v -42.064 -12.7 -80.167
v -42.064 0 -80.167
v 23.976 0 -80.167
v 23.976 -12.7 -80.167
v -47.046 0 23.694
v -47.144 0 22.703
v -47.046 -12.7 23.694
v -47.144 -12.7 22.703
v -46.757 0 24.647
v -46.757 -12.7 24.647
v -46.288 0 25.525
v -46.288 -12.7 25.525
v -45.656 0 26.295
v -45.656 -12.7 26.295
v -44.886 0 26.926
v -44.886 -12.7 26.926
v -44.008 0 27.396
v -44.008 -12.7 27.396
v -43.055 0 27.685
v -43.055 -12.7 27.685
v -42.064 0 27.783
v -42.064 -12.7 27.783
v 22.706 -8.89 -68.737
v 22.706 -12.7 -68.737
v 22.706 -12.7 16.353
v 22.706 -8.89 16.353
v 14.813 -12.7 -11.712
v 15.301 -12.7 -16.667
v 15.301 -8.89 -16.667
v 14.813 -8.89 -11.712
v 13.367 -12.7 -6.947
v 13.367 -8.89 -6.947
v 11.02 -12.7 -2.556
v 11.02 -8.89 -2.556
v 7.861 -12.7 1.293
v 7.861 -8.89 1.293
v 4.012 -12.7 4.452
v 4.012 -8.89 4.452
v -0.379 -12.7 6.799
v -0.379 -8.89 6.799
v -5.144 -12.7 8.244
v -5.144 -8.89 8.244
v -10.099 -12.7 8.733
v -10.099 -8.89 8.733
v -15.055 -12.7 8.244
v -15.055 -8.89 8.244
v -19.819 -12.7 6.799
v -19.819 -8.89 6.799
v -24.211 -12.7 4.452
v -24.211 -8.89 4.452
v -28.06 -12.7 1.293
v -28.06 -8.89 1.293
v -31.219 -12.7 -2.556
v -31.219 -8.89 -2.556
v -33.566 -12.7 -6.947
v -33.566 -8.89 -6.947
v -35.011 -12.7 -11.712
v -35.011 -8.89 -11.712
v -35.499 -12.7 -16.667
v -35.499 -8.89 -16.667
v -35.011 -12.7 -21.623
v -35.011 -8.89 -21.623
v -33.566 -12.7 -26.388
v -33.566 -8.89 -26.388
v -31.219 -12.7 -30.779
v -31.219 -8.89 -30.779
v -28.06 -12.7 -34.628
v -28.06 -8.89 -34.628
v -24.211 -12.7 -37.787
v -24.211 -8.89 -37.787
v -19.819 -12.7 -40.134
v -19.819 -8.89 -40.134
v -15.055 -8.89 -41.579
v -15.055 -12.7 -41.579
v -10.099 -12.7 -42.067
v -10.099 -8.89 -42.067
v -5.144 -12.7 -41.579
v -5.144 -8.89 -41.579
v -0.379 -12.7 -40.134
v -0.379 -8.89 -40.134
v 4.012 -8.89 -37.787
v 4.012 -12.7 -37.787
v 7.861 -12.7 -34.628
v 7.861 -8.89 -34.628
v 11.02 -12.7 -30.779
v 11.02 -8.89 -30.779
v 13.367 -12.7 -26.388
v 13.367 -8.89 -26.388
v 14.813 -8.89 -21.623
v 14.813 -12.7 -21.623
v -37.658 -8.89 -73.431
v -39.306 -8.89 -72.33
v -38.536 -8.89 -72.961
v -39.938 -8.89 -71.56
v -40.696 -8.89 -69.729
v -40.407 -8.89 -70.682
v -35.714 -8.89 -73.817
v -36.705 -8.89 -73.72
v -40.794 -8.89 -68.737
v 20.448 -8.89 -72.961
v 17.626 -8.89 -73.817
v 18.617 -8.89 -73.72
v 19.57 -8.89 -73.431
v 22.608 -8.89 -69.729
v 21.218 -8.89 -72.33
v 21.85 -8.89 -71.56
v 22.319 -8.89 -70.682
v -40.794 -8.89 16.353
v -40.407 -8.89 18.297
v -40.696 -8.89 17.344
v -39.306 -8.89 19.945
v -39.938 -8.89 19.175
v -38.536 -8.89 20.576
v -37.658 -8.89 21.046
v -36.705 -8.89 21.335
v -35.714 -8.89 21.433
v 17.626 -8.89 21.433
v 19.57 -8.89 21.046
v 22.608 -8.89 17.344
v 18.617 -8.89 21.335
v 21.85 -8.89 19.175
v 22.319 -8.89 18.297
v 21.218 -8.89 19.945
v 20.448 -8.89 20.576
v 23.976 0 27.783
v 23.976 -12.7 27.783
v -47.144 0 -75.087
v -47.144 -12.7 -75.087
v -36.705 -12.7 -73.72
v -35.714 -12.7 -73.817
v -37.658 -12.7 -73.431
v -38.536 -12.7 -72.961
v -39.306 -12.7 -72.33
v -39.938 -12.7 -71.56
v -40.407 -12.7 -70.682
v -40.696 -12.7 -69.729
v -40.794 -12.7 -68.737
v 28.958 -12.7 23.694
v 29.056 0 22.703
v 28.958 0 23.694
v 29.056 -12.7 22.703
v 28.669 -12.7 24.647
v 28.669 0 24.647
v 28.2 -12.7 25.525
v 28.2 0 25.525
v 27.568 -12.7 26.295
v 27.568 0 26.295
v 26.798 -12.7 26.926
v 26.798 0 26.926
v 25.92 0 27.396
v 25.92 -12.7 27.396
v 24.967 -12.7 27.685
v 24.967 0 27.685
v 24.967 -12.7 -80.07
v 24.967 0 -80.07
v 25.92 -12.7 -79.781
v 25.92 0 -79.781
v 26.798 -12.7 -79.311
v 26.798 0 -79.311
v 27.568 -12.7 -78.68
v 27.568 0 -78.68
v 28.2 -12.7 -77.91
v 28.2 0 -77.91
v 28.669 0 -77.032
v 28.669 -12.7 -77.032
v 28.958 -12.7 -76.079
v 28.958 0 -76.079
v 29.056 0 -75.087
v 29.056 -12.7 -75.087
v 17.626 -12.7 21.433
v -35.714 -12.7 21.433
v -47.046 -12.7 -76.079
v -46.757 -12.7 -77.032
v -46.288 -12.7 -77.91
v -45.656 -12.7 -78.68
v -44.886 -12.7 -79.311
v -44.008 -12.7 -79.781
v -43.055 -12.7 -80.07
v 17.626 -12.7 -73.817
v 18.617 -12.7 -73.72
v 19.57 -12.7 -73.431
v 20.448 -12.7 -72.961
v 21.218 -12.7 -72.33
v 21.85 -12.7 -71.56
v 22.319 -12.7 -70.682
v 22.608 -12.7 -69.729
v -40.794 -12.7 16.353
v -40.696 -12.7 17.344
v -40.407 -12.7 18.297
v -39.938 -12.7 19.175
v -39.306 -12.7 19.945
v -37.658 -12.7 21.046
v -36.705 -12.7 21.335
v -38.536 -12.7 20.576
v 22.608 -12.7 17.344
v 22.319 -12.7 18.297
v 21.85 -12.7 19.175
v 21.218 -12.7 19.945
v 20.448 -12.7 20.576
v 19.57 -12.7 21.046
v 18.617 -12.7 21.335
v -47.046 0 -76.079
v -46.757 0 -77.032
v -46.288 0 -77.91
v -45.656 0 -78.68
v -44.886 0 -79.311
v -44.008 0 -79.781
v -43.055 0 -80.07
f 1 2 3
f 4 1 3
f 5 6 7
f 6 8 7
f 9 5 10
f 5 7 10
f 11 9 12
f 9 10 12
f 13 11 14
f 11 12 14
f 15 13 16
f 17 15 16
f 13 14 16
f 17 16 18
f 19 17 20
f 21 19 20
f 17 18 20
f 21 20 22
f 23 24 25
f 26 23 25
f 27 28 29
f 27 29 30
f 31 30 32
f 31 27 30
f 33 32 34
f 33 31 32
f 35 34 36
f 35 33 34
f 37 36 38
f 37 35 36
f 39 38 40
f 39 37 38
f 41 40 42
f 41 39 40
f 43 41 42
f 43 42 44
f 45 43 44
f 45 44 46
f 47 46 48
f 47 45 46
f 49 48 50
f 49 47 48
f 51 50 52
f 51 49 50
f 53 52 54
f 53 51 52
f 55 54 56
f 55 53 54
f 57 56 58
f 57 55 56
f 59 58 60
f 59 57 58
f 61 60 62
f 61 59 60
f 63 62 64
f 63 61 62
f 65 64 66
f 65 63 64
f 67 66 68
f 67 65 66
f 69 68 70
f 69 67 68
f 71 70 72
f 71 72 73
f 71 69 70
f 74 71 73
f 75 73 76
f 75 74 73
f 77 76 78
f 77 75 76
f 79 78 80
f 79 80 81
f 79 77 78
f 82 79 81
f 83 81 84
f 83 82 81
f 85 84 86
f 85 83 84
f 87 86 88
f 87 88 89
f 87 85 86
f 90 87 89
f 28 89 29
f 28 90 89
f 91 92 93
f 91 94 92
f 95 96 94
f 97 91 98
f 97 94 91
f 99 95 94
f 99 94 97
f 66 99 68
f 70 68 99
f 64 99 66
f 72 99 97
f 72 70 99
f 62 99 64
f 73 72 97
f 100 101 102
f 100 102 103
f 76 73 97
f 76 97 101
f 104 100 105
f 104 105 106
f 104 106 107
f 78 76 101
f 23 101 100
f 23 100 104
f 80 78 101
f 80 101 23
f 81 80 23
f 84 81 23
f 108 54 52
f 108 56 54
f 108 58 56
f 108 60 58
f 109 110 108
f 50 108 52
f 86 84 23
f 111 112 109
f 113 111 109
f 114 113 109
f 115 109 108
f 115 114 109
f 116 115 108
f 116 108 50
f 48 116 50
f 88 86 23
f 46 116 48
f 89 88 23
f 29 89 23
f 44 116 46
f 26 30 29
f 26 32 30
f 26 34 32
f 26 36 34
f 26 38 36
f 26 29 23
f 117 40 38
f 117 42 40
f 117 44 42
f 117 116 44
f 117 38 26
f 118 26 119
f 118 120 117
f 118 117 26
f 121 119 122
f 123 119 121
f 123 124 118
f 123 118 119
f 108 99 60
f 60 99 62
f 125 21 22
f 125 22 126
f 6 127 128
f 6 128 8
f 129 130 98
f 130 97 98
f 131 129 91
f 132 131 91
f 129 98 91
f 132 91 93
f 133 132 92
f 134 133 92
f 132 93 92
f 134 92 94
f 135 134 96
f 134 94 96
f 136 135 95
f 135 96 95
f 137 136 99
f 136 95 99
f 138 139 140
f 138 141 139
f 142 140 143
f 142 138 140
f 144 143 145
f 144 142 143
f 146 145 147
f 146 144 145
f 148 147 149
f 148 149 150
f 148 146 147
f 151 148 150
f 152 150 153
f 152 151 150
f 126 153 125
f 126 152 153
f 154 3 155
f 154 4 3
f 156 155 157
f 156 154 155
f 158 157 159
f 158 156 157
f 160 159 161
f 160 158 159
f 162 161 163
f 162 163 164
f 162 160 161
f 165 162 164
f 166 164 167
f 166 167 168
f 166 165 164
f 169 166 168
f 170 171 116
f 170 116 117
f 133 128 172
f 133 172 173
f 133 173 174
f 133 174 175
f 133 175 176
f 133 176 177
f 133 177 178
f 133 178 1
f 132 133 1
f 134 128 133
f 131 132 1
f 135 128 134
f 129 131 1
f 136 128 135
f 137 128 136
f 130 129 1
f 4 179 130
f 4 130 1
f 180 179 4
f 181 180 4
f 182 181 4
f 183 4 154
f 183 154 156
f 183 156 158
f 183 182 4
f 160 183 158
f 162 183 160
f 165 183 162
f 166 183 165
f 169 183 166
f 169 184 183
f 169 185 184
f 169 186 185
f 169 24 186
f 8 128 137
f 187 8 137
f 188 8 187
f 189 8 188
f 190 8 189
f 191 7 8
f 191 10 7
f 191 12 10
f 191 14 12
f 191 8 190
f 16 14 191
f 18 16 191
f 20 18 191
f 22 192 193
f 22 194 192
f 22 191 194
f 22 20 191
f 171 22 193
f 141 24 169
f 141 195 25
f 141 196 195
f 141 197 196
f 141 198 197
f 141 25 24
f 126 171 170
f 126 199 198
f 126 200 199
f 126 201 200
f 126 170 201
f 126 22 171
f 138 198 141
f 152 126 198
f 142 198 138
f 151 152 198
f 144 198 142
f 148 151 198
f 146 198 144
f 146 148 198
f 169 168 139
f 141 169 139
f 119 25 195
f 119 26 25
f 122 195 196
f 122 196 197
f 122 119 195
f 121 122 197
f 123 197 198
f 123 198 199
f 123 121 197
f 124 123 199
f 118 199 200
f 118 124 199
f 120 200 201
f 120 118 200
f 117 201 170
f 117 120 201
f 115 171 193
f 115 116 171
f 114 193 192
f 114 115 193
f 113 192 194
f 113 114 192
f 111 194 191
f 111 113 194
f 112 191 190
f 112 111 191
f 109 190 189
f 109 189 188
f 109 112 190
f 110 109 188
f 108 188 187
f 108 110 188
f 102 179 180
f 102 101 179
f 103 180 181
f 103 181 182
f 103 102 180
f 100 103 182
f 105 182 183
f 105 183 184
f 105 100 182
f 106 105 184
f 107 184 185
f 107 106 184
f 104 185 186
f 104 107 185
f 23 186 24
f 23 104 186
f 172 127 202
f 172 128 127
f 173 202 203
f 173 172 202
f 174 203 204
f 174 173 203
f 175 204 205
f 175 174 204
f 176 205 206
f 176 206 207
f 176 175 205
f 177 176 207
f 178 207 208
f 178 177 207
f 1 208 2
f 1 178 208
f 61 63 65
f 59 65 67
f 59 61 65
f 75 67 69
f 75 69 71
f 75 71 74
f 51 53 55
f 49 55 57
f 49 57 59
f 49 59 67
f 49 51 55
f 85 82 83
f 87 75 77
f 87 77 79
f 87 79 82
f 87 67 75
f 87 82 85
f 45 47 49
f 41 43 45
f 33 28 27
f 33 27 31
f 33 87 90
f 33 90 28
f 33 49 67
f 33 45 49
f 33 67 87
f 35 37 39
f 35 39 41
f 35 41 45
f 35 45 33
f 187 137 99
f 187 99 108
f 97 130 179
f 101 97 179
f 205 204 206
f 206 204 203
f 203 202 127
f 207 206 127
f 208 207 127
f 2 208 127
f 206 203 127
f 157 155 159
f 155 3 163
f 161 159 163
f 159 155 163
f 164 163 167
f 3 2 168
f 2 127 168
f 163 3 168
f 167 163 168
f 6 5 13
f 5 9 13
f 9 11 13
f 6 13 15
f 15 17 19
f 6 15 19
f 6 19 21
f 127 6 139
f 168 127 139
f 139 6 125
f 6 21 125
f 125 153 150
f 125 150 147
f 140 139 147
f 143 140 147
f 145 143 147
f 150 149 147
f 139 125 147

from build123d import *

# Parameters (mm, degrees)
F0_W     = 76.2
F0_H     = 107.95
F1_DEPTH = 12.7
F2_R     = 5.08
F3_W     = 63.5
F3_H     = 95.25
F3_R     = 25.4
F4_DEPTH = 3.81
F5_R     = 5.08


with BuildPart() as f1:
    # F0 (on Front) → F1 (new body)
    with BuildSketch(Plane.XZ):
        with Locations((-9.044009, -26.192475)):
            Rectangle(F0_W, F0_H)
    extrude(amount=F1_DEPTH)

    # F2
    f2_edges = [f1.edges().sort_by_distance(p)[0] for p in [
        (-47.144009, -6.35, 27.782525),
        (29.055991, -6.35, 27.782525),
        (29.055991, -6.35, -80.167475),
        (-47.144009, -6.35, -80.167475),
    ]]
    fillet(f2_edges, radius=F2_R)

    # F3 (on face) → F4 (cut)
    with BuildSketch(Plane.XZ.offset(12.7)):
        with Locations((-9.044009, -26.192475)):
            Rectangle(F3_W, F3_H)
        with Locations((-10.099306, -16.667475)):
            Circle(F3_R, mode=Mode.SUBTRACT)
    extrude(amount=-F4_DEPTH, mode=Mode.SUBTRACT)

    # F5
    f5_edges = [f1.edges().sort_by_distance(p)[0] for p in [
        (-40.794009, -10.795, 21.432525),
        (22.705991, -10.795, 21.432525),
        (22.705991, -10.795, -73.817475),
        (-40.794009, -10.795, -73.817475),
    ]]
    fillet(f5_edges, radius=F5_R)


solid = f1.part
